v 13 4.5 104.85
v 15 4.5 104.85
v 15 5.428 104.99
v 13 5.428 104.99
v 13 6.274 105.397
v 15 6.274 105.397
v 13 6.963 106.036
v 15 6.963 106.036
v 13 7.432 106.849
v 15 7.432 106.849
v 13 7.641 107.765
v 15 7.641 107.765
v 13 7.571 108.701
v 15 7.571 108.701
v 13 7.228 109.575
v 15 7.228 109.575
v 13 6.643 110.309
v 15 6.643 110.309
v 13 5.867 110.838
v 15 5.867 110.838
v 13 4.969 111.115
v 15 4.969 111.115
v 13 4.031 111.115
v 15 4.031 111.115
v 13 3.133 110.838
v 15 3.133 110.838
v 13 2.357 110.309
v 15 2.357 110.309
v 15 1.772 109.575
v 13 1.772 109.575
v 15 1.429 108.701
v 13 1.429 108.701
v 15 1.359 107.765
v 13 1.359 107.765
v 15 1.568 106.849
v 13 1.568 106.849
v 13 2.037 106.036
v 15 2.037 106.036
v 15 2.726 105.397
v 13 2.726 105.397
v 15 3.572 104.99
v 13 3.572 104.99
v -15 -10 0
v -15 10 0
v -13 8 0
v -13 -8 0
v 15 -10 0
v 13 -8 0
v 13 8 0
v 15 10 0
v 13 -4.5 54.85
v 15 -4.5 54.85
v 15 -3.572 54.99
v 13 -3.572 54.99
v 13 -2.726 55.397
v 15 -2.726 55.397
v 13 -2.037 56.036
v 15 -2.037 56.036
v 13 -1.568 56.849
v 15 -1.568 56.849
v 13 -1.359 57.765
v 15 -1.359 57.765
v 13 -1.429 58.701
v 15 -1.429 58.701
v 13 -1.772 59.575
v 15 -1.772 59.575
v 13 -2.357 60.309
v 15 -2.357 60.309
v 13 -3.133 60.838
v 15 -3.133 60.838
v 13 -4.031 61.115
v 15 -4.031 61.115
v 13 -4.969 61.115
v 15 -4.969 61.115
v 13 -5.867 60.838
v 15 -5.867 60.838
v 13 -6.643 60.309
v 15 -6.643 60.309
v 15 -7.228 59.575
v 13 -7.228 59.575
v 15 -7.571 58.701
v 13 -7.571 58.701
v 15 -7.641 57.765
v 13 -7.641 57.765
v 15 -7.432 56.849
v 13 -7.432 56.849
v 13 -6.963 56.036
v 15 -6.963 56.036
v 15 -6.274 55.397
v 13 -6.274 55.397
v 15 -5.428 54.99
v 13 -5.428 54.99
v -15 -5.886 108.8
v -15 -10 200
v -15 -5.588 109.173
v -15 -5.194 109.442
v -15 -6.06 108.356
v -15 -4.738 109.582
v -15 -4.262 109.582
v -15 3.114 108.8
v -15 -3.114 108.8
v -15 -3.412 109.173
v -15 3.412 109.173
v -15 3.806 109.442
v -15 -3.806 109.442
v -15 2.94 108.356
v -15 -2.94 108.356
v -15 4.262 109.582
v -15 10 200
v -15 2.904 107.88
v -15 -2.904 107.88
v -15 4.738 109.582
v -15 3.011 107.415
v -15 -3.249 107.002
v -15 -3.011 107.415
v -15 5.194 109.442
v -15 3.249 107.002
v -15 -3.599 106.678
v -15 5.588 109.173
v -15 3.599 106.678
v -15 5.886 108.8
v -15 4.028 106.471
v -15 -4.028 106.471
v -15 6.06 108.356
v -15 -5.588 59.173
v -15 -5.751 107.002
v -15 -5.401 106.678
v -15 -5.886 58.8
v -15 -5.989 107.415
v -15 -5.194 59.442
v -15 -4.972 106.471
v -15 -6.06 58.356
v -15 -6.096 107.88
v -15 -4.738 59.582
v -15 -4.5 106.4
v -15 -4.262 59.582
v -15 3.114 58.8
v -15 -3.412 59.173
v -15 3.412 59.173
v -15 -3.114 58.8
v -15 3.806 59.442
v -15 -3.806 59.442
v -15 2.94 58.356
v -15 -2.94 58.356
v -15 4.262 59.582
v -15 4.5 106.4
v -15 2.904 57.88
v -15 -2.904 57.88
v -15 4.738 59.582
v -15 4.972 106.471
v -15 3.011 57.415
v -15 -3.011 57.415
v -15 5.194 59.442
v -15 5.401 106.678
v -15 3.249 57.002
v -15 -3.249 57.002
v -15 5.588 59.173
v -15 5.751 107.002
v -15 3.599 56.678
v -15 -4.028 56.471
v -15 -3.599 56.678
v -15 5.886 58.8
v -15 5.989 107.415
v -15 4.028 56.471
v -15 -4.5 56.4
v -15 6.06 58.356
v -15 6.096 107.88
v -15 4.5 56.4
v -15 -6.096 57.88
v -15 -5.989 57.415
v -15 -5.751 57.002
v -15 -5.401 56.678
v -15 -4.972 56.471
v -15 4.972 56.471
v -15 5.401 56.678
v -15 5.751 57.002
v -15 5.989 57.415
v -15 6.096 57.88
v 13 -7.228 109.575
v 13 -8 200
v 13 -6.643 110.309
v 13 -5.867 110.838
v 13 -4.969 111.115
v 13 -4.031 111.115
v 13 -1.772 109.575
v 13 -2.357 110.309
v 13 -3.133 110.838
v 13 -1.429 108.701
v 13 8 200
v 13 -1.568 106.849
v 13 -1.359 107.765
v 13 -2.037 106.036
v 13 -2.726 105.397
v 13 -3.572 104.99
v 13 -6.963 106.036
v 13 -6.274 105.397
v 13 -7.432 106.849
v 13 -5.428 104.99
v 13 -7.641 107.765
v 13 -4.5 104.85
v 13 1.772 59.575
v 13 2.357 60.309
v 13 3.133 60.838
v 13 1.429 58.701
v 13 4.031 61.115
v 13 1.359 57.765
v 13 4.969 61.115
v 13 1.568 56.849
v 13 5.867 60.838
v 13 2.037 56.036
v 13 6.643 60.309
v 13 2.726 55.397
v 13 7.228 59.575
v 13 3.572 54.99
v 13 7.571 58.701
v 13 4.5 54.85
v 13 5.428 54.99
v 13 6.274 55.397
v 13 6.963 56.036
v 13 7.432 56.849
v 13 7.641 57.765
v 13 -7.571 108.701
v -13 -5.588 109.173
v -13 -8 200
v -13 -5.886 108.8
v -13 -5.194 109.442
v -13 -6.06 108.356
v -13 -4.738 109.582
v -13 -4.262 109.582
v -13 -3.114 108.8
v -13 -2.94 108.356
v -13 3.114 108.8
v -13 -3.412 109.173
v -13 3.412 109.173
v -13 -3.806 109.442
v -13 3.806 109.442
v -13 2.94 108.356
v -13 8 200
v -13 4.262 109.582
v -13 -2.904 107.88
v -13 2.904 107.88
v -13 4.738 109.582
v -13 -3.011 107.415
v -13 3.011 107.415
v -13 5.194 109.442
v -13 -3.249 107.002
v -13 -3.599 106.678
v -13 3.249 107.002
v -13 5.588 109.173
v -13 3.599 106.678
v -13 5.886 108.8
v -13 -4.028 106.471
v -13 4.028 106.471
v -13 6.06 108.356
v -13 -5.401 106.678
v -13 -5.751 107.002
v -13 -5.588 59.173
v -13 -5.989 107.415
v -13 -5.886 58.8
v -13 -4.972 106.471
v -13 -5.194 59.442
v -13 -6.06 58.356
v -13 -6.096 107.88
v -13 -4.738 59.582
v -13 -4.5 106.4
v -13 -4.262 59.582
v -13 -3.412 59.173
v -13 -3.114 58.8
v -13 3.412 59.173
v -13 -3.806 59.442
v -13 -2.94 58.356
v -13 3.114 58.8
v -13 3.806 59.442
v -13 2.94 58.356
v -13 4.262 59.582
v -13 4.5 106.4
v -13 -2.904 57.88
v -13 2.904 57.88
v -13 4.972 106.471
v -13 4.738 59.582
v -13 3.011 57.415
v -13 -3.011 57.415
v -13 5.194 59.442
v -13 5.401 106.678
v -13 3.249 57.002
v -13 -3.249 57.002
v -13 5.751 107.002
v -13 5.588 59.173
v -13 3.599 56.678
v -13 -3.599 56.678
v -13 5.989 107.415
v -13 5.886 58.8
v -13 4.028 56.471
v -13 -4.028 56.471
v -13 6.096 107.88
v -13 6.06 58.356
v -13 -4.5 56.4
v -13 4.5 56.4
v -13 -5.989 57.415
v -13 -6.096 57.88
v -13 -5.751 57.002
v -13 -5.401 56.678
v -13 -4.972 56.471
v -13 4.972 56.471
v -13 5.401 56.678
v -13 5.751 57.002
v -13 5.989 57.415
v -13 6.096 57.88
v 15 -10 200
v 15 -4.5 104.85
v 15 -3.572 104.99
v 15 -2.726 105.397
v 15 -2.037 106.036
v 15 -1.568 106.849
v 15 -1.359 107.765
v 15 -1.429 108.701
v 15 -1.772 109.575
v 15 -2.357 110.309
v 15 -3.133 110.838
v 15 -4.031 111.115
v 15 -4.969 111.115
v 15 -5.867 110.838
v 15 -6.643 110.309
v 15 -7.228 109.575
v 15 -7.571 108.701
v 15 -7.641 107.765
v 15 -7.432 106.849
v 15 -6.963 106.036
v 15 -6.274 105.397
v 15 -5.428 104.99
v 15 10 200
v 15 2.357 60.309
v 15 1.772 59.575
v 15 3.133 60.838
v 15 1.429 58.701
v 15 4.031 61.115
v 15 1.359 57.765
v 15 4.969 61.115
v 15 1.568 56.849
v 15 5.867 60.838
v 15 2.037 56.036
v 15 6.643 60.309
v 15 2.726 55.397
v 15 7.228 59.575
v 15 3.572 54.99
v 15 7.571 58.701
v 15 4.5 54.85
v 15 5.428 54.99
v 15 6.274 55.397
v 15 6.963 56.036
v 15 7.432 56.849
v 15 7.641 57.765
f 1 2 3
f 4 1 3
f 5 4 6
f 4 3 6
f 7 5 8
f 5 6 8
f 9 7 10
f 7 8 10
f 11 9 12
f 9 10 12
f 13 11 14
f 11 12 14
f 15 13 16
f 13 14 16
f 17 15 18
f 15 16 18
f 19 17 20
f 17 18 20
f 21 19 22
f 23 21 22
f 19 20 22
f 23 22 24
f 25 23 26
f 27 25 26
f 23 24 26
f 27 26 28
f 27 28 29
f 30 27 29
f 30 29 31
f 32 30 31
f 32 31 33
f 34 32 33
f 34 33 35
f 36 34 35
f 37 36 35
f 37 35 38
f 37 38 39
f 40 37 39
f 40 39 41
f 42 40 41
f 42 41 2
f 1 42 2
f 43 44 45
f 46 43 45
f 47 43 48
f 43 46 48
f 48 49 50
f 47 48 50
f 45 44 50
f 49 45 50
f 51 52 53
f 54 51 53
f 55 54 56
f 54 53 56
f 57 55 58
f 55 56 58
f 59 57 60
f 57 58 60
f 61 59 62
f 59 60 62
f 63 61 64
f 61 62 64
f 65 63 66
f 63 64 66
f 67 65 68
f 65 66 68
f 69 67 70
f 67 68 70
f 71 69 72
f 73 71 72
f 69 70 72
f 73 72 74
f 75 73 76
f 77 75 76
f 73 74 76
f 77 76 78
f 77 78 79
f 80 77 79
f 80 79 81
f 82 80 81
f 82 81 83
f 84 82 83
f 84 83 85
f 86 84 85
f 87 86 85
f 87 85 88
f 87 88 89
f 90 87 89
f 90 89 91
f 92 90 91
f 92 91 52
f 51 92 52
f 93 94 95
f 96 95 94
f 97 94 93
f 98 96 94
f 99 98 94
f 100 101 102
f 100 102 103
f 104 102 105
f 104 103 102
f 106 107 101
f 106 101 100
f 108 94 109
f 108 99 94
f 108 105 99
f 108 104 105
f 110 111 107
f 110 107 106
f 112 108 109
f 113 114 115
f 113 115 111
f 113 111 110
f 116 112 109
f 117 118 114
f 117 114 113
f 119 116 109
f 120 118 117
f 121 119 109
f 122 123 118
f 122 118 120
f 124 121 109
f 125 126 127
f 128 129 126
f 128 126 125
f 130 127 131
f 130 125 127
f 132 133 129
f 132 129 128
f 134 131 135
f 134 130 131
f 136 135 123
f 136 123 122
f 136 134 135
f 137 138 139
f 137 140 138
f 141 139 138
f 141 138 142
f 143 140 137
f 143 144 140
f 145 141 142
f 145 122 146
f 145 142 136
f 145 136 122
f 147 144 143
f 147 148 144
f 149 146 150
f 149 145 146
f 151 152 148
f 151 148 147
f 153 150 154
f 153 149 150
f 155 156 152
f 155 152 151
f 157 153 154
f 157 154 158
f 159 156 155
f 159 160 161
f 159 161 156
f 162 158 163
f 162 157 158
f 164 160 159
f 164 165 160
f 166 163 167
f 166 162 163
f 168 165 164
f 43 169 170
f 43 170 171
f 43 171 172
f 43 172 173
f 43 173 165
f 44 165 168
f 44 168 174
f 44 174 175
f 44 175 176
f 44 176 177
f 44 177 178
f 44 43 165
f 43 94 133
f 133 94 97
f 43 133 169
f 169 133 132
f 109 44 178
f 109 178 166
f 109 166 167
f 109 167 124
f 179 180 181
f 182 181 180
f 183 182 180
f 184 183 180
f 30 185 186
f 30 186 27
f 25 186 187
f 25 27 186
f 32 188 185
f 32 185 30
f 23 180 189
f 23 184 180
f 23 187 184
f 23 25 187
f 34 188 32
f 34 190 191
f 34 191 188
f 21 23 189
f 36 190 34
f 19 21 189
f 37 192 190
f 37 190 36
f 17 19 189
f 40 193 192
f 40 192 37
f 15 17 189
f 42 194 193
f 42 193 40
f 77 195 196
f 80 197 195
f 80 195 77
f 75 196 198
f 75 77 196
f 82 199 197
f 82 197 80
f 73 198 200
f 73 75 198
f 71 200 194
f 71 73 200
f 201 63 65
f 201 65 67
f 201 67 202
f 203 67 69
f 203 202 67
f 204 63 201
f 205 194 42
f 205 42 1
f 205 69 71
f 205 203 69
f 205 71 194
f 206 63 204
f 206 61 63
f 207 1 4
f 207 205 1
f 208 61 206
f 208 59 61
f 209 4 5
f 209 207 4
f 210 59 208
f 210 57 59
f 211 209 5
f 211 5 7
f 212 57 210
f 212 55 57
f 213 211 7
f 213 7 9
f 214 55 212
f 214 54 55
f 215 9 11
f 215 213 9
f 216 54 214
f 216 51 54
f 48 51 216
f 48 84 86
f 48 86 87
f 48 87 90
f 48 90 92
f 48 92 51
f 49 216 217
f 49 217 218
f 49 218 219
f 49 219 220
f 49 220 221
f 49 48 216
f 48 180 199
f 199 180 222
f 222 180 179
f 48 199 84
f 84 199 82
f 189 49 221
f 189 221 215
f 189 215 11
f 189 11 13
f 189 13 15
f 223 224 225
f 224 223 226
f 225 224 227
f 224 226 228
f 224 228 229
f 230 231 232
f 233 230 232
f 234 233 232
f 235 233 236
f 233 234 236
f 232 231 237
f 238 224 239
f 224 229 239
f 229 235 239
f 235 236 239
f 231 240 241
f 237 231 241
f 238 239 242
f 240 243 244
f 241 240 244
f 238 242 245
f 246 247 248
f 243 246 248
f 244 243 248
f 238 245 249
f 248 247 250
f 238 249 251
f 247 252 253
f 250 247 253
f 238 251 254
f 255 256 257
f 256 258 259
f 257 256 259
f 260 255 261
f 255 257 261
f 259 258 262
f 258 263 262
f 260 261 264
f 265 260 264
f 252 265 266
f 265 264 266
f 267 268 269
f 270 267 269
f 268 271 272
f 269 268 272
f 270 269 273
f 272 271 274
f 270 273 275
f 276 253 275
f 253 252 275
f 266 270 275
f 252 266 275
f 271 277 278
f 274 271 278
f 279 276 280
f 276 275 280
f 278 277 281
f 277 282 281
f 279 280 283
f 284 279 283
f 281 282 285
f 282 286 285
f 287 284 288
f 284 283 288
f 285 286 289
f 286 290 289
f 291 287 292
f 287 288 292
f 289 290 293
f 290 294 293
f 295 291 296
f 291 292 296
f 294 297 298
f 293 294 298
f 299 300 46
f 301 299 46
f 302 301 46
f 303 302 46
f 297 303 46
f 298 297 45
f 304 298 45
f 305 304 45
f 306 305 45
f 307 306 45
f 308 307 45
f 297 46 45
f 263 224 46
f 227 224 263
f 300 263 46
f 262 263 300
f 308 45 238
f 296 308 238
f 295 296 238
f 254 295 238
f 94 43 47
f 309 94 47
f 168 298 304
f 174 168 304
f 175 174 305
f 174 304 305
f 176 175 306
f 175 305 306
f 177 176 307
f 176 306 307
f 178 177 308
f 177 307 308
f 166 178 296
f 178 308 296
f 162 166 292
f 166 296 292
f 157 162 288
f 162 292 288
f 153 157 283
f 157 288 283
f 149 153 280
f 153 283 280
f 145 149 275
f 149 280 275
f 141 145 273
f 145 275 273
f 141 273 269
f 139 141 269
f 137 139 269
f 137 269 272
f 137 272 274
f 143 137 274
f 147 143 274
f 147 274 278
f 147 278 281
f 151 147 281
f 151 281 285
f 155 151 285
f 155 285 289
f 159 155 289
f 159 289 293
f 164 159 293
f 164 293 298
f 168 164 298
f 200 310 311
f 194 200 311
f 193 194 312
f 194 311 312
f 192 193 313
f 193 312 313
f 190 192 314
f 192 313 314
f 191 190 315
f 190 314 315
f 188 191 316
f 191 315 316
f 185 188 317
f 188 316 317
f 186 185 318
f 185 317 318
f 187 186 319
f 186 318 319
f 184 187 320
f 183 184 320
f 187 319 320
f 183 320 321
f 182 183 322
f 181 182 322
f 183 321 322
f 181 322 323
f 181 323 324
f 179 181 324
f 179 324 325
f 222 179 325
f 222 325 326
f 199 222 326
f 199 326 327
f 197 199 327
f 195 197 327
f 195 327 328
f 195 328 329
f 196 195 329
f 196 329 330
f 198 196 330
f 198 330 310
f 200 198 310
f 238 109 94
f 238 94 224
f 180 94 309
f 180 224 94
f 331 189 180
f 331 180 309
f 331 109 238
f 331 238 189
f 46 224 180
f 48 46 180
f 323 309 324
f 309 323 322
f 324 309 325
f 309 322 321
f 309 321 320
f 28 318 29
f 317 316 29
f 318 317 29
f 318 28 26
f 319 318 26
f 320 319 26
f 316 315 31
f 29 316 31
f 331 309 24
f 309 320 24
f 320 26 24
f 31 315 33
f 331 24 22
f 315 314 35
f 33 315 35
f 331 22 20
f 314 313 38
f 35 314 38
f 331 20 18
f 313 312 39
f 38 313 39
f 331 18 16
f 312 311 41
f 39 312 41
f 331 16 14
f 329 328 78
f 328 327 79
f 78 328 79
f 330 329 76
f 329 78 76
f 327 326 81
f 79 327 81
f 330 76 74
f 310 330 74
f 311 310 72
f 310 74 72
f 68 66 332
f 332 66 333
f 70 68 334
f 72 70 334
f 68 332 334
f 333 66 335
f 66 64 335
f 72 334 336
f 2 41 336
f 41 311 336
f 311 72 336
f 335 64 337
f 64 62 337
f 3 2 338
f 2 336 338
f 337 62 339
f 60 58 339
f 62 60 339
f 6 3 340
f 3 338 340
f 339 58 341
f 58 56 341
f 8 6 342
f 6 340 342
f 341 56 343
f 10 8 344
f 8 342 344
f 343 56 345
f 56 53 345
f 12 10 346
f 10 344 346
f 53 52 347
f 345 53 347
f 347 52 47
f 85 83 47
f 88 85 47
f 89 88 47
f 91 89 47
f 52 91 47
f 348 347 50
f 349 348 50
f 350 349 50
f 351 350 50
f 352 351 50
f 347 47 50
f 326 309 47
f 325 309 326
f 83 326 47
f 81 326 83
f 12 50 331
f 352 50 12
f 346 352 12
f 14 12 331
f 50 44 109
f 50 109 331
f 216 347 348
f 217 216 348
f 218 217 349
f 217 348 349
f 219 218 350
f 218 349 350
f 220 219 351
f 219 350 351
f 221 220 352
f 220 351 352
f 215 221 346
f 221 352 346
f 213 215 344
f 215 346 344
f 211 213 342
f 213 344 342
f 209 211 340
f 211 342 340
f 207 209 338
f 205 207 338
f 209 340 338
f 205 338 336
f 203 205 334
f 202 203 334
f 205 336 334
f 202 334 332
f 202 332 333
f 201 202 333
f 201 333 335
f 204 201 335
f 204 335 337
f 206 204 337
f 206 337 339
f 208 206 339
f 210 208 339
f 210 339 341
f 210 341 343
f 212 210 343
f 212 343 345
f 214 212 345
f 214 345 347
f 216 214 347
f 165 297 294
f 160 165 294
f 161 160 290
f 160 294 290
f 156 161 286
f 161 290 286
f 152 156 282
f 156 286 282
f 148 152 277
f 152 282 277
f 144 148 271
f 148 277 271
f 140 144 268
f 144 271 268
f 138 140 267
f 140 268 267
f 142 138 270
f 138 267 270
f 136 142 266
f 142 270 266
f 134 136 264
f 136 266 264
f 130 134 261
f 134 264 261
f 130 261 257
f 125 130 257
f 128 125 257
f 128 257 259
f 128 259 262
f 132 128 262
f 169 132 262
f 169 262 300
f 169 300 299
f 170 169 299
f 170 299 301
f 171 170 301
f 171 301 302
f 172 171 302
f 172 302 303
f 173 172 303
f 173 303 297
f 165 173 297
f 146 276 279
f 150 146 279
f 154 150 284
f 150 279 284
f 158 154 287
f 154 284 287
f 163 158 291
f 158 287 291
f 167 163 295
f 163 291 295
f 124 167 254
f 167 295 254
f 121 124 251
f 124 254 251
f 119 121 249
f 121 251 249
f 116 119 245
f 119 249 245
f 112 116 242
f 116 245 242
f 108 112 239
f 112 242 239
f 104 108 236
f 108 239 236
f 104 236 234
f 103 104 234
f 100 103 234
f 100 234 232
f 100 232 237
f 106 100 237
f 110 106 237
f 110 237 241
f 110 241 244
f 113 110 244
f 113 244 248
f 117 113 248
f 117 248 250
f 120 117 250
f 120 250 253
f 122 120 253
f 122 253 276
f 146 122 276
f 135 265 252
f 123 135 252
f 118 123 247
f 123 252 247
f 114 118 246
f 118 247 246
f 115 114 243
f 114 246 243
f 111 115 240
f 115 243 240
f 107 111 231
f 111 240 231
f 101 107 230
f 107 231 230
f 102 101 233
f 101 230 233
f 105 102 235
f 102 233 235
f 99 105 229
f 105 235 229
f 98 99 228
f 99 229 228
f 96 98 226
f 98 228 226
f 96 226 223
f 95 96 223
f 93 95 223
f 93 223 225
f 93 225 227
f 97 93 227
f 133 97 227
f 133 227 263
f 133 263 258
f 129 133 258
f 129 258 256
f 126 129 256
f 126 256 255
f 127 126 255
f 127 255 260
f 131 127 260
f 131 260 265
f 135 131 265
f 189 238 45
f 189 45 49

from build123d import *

# Parameters (mm, degrees)
SKETCH_1_W          = 30
SKETCH_1_H          = 20
SKETCH_1_W_2        = 26
SKETCH_1_H_2        = 16
EXTRUDE_1_DEPTH     = 200
SKETCH_2_R          = 1.6
CUT_EXTRUDE_1_DEPTH = 203.484567313
SKETCH_2_3_R        = 3.15
SKETCH_2_3_R_2      = 1.6
CUT_EXTRUDE_2_DEPTH = 3


with BuildPart() as part:
    # Эскиз1 → Бобышка-Вытянуть1 (new body)
    with BuildSketch(Plane.XY):
        Rectangle(SKETCH_1_W, SKETCH_1_H)
        Rectangle(SKETCH_1_W_2, SKETCH_1_H_2, mode=Mode.SUBTRACT)
    extrude(amount=EXTRUDE_1_DEPTH)

    # Эскиз2 → Вырез-Вытянуть1 (cut, through all)
    with BuildSketch(Plane(origin=(15, 0, 0), x_dir=(0, 0, -1), z_dir=(1, 0, 0))):
        with Locations((-108, 4.5)):
            Circle(SKETCH_2_R)
        with Locations((-108, -4.5)):
            Circle(SKETCH_2_R)
        with Locations((-58, -4.5)):
            Circle(SKETCH_2_R)
        with Locations((-58, 4.5)):
            Circle(SKETCH_2_R)
    extrude(amount=-CUT_EXTRUDE_1_DEPTH, mode=Mode.SUBTRACT)

    # Эскиз2<3> → Вырез-Вытянуть2 (cut)
    # profile 1 of 4: a face of its own
    with BuildSketch(Plane(origin=(15, 0, 0), x_dir=(0, 0, -1), z_dir=(1, 0, 0))):
        with Locations((-108, -4.5)):
            Circle(SKETCH_2_3_R)
        with Locations((-108, -4.5)):
            Circle(SKETCH_2_3_R_2, mode=Mode.SUBTRACT)
    # profile 2 of 4: a face of its own
    with BuildSketch(Plane(origin=(15, 0, 0), x_dir=(0, 0, -1), z_dir=(1, 0, 0))):
        with Locations((-108, 4.5)):
            Circle(SKETCH_2_3_R)
        with Locations((-108, 4.5)):
            Circle(SKETCH_2_3_R_2, mode=Mode.SUBTRACT)
    # profile 3 of 4: a face of its own
    with BuildSketch(Plane(origin=(15, 0, 0), x_dir=(0, 0, -1), z_dir=(1, 0, 0))):
        with Locations((-58, -4.5)):
            Circle(SKETCH_2_3_R)
        with Locations((-58, -4.5)):
            Circle(SKETCH_2_3_R_2, mode=Mode.SUBTRACT)
    # profile 4 of 4: a face of its own
    with BuildSketch(Plane(origin=(15, 0, 0), x_dir=(0, 0, -1), z_dir=(1, 0, 0))):
        with Locations((-58, 4.5)):
            Circle(SKETCH_2_3_R)
        with Locations((-58, 4.5)):
            Circle(SKETCH_2_3_R_2, mode=Mode.SUBTRACT)
    extrude(amount=-CUT_EXTRUDE_2_DEPTH, mode=Mode.SUBTRACT)


solid = part.part
